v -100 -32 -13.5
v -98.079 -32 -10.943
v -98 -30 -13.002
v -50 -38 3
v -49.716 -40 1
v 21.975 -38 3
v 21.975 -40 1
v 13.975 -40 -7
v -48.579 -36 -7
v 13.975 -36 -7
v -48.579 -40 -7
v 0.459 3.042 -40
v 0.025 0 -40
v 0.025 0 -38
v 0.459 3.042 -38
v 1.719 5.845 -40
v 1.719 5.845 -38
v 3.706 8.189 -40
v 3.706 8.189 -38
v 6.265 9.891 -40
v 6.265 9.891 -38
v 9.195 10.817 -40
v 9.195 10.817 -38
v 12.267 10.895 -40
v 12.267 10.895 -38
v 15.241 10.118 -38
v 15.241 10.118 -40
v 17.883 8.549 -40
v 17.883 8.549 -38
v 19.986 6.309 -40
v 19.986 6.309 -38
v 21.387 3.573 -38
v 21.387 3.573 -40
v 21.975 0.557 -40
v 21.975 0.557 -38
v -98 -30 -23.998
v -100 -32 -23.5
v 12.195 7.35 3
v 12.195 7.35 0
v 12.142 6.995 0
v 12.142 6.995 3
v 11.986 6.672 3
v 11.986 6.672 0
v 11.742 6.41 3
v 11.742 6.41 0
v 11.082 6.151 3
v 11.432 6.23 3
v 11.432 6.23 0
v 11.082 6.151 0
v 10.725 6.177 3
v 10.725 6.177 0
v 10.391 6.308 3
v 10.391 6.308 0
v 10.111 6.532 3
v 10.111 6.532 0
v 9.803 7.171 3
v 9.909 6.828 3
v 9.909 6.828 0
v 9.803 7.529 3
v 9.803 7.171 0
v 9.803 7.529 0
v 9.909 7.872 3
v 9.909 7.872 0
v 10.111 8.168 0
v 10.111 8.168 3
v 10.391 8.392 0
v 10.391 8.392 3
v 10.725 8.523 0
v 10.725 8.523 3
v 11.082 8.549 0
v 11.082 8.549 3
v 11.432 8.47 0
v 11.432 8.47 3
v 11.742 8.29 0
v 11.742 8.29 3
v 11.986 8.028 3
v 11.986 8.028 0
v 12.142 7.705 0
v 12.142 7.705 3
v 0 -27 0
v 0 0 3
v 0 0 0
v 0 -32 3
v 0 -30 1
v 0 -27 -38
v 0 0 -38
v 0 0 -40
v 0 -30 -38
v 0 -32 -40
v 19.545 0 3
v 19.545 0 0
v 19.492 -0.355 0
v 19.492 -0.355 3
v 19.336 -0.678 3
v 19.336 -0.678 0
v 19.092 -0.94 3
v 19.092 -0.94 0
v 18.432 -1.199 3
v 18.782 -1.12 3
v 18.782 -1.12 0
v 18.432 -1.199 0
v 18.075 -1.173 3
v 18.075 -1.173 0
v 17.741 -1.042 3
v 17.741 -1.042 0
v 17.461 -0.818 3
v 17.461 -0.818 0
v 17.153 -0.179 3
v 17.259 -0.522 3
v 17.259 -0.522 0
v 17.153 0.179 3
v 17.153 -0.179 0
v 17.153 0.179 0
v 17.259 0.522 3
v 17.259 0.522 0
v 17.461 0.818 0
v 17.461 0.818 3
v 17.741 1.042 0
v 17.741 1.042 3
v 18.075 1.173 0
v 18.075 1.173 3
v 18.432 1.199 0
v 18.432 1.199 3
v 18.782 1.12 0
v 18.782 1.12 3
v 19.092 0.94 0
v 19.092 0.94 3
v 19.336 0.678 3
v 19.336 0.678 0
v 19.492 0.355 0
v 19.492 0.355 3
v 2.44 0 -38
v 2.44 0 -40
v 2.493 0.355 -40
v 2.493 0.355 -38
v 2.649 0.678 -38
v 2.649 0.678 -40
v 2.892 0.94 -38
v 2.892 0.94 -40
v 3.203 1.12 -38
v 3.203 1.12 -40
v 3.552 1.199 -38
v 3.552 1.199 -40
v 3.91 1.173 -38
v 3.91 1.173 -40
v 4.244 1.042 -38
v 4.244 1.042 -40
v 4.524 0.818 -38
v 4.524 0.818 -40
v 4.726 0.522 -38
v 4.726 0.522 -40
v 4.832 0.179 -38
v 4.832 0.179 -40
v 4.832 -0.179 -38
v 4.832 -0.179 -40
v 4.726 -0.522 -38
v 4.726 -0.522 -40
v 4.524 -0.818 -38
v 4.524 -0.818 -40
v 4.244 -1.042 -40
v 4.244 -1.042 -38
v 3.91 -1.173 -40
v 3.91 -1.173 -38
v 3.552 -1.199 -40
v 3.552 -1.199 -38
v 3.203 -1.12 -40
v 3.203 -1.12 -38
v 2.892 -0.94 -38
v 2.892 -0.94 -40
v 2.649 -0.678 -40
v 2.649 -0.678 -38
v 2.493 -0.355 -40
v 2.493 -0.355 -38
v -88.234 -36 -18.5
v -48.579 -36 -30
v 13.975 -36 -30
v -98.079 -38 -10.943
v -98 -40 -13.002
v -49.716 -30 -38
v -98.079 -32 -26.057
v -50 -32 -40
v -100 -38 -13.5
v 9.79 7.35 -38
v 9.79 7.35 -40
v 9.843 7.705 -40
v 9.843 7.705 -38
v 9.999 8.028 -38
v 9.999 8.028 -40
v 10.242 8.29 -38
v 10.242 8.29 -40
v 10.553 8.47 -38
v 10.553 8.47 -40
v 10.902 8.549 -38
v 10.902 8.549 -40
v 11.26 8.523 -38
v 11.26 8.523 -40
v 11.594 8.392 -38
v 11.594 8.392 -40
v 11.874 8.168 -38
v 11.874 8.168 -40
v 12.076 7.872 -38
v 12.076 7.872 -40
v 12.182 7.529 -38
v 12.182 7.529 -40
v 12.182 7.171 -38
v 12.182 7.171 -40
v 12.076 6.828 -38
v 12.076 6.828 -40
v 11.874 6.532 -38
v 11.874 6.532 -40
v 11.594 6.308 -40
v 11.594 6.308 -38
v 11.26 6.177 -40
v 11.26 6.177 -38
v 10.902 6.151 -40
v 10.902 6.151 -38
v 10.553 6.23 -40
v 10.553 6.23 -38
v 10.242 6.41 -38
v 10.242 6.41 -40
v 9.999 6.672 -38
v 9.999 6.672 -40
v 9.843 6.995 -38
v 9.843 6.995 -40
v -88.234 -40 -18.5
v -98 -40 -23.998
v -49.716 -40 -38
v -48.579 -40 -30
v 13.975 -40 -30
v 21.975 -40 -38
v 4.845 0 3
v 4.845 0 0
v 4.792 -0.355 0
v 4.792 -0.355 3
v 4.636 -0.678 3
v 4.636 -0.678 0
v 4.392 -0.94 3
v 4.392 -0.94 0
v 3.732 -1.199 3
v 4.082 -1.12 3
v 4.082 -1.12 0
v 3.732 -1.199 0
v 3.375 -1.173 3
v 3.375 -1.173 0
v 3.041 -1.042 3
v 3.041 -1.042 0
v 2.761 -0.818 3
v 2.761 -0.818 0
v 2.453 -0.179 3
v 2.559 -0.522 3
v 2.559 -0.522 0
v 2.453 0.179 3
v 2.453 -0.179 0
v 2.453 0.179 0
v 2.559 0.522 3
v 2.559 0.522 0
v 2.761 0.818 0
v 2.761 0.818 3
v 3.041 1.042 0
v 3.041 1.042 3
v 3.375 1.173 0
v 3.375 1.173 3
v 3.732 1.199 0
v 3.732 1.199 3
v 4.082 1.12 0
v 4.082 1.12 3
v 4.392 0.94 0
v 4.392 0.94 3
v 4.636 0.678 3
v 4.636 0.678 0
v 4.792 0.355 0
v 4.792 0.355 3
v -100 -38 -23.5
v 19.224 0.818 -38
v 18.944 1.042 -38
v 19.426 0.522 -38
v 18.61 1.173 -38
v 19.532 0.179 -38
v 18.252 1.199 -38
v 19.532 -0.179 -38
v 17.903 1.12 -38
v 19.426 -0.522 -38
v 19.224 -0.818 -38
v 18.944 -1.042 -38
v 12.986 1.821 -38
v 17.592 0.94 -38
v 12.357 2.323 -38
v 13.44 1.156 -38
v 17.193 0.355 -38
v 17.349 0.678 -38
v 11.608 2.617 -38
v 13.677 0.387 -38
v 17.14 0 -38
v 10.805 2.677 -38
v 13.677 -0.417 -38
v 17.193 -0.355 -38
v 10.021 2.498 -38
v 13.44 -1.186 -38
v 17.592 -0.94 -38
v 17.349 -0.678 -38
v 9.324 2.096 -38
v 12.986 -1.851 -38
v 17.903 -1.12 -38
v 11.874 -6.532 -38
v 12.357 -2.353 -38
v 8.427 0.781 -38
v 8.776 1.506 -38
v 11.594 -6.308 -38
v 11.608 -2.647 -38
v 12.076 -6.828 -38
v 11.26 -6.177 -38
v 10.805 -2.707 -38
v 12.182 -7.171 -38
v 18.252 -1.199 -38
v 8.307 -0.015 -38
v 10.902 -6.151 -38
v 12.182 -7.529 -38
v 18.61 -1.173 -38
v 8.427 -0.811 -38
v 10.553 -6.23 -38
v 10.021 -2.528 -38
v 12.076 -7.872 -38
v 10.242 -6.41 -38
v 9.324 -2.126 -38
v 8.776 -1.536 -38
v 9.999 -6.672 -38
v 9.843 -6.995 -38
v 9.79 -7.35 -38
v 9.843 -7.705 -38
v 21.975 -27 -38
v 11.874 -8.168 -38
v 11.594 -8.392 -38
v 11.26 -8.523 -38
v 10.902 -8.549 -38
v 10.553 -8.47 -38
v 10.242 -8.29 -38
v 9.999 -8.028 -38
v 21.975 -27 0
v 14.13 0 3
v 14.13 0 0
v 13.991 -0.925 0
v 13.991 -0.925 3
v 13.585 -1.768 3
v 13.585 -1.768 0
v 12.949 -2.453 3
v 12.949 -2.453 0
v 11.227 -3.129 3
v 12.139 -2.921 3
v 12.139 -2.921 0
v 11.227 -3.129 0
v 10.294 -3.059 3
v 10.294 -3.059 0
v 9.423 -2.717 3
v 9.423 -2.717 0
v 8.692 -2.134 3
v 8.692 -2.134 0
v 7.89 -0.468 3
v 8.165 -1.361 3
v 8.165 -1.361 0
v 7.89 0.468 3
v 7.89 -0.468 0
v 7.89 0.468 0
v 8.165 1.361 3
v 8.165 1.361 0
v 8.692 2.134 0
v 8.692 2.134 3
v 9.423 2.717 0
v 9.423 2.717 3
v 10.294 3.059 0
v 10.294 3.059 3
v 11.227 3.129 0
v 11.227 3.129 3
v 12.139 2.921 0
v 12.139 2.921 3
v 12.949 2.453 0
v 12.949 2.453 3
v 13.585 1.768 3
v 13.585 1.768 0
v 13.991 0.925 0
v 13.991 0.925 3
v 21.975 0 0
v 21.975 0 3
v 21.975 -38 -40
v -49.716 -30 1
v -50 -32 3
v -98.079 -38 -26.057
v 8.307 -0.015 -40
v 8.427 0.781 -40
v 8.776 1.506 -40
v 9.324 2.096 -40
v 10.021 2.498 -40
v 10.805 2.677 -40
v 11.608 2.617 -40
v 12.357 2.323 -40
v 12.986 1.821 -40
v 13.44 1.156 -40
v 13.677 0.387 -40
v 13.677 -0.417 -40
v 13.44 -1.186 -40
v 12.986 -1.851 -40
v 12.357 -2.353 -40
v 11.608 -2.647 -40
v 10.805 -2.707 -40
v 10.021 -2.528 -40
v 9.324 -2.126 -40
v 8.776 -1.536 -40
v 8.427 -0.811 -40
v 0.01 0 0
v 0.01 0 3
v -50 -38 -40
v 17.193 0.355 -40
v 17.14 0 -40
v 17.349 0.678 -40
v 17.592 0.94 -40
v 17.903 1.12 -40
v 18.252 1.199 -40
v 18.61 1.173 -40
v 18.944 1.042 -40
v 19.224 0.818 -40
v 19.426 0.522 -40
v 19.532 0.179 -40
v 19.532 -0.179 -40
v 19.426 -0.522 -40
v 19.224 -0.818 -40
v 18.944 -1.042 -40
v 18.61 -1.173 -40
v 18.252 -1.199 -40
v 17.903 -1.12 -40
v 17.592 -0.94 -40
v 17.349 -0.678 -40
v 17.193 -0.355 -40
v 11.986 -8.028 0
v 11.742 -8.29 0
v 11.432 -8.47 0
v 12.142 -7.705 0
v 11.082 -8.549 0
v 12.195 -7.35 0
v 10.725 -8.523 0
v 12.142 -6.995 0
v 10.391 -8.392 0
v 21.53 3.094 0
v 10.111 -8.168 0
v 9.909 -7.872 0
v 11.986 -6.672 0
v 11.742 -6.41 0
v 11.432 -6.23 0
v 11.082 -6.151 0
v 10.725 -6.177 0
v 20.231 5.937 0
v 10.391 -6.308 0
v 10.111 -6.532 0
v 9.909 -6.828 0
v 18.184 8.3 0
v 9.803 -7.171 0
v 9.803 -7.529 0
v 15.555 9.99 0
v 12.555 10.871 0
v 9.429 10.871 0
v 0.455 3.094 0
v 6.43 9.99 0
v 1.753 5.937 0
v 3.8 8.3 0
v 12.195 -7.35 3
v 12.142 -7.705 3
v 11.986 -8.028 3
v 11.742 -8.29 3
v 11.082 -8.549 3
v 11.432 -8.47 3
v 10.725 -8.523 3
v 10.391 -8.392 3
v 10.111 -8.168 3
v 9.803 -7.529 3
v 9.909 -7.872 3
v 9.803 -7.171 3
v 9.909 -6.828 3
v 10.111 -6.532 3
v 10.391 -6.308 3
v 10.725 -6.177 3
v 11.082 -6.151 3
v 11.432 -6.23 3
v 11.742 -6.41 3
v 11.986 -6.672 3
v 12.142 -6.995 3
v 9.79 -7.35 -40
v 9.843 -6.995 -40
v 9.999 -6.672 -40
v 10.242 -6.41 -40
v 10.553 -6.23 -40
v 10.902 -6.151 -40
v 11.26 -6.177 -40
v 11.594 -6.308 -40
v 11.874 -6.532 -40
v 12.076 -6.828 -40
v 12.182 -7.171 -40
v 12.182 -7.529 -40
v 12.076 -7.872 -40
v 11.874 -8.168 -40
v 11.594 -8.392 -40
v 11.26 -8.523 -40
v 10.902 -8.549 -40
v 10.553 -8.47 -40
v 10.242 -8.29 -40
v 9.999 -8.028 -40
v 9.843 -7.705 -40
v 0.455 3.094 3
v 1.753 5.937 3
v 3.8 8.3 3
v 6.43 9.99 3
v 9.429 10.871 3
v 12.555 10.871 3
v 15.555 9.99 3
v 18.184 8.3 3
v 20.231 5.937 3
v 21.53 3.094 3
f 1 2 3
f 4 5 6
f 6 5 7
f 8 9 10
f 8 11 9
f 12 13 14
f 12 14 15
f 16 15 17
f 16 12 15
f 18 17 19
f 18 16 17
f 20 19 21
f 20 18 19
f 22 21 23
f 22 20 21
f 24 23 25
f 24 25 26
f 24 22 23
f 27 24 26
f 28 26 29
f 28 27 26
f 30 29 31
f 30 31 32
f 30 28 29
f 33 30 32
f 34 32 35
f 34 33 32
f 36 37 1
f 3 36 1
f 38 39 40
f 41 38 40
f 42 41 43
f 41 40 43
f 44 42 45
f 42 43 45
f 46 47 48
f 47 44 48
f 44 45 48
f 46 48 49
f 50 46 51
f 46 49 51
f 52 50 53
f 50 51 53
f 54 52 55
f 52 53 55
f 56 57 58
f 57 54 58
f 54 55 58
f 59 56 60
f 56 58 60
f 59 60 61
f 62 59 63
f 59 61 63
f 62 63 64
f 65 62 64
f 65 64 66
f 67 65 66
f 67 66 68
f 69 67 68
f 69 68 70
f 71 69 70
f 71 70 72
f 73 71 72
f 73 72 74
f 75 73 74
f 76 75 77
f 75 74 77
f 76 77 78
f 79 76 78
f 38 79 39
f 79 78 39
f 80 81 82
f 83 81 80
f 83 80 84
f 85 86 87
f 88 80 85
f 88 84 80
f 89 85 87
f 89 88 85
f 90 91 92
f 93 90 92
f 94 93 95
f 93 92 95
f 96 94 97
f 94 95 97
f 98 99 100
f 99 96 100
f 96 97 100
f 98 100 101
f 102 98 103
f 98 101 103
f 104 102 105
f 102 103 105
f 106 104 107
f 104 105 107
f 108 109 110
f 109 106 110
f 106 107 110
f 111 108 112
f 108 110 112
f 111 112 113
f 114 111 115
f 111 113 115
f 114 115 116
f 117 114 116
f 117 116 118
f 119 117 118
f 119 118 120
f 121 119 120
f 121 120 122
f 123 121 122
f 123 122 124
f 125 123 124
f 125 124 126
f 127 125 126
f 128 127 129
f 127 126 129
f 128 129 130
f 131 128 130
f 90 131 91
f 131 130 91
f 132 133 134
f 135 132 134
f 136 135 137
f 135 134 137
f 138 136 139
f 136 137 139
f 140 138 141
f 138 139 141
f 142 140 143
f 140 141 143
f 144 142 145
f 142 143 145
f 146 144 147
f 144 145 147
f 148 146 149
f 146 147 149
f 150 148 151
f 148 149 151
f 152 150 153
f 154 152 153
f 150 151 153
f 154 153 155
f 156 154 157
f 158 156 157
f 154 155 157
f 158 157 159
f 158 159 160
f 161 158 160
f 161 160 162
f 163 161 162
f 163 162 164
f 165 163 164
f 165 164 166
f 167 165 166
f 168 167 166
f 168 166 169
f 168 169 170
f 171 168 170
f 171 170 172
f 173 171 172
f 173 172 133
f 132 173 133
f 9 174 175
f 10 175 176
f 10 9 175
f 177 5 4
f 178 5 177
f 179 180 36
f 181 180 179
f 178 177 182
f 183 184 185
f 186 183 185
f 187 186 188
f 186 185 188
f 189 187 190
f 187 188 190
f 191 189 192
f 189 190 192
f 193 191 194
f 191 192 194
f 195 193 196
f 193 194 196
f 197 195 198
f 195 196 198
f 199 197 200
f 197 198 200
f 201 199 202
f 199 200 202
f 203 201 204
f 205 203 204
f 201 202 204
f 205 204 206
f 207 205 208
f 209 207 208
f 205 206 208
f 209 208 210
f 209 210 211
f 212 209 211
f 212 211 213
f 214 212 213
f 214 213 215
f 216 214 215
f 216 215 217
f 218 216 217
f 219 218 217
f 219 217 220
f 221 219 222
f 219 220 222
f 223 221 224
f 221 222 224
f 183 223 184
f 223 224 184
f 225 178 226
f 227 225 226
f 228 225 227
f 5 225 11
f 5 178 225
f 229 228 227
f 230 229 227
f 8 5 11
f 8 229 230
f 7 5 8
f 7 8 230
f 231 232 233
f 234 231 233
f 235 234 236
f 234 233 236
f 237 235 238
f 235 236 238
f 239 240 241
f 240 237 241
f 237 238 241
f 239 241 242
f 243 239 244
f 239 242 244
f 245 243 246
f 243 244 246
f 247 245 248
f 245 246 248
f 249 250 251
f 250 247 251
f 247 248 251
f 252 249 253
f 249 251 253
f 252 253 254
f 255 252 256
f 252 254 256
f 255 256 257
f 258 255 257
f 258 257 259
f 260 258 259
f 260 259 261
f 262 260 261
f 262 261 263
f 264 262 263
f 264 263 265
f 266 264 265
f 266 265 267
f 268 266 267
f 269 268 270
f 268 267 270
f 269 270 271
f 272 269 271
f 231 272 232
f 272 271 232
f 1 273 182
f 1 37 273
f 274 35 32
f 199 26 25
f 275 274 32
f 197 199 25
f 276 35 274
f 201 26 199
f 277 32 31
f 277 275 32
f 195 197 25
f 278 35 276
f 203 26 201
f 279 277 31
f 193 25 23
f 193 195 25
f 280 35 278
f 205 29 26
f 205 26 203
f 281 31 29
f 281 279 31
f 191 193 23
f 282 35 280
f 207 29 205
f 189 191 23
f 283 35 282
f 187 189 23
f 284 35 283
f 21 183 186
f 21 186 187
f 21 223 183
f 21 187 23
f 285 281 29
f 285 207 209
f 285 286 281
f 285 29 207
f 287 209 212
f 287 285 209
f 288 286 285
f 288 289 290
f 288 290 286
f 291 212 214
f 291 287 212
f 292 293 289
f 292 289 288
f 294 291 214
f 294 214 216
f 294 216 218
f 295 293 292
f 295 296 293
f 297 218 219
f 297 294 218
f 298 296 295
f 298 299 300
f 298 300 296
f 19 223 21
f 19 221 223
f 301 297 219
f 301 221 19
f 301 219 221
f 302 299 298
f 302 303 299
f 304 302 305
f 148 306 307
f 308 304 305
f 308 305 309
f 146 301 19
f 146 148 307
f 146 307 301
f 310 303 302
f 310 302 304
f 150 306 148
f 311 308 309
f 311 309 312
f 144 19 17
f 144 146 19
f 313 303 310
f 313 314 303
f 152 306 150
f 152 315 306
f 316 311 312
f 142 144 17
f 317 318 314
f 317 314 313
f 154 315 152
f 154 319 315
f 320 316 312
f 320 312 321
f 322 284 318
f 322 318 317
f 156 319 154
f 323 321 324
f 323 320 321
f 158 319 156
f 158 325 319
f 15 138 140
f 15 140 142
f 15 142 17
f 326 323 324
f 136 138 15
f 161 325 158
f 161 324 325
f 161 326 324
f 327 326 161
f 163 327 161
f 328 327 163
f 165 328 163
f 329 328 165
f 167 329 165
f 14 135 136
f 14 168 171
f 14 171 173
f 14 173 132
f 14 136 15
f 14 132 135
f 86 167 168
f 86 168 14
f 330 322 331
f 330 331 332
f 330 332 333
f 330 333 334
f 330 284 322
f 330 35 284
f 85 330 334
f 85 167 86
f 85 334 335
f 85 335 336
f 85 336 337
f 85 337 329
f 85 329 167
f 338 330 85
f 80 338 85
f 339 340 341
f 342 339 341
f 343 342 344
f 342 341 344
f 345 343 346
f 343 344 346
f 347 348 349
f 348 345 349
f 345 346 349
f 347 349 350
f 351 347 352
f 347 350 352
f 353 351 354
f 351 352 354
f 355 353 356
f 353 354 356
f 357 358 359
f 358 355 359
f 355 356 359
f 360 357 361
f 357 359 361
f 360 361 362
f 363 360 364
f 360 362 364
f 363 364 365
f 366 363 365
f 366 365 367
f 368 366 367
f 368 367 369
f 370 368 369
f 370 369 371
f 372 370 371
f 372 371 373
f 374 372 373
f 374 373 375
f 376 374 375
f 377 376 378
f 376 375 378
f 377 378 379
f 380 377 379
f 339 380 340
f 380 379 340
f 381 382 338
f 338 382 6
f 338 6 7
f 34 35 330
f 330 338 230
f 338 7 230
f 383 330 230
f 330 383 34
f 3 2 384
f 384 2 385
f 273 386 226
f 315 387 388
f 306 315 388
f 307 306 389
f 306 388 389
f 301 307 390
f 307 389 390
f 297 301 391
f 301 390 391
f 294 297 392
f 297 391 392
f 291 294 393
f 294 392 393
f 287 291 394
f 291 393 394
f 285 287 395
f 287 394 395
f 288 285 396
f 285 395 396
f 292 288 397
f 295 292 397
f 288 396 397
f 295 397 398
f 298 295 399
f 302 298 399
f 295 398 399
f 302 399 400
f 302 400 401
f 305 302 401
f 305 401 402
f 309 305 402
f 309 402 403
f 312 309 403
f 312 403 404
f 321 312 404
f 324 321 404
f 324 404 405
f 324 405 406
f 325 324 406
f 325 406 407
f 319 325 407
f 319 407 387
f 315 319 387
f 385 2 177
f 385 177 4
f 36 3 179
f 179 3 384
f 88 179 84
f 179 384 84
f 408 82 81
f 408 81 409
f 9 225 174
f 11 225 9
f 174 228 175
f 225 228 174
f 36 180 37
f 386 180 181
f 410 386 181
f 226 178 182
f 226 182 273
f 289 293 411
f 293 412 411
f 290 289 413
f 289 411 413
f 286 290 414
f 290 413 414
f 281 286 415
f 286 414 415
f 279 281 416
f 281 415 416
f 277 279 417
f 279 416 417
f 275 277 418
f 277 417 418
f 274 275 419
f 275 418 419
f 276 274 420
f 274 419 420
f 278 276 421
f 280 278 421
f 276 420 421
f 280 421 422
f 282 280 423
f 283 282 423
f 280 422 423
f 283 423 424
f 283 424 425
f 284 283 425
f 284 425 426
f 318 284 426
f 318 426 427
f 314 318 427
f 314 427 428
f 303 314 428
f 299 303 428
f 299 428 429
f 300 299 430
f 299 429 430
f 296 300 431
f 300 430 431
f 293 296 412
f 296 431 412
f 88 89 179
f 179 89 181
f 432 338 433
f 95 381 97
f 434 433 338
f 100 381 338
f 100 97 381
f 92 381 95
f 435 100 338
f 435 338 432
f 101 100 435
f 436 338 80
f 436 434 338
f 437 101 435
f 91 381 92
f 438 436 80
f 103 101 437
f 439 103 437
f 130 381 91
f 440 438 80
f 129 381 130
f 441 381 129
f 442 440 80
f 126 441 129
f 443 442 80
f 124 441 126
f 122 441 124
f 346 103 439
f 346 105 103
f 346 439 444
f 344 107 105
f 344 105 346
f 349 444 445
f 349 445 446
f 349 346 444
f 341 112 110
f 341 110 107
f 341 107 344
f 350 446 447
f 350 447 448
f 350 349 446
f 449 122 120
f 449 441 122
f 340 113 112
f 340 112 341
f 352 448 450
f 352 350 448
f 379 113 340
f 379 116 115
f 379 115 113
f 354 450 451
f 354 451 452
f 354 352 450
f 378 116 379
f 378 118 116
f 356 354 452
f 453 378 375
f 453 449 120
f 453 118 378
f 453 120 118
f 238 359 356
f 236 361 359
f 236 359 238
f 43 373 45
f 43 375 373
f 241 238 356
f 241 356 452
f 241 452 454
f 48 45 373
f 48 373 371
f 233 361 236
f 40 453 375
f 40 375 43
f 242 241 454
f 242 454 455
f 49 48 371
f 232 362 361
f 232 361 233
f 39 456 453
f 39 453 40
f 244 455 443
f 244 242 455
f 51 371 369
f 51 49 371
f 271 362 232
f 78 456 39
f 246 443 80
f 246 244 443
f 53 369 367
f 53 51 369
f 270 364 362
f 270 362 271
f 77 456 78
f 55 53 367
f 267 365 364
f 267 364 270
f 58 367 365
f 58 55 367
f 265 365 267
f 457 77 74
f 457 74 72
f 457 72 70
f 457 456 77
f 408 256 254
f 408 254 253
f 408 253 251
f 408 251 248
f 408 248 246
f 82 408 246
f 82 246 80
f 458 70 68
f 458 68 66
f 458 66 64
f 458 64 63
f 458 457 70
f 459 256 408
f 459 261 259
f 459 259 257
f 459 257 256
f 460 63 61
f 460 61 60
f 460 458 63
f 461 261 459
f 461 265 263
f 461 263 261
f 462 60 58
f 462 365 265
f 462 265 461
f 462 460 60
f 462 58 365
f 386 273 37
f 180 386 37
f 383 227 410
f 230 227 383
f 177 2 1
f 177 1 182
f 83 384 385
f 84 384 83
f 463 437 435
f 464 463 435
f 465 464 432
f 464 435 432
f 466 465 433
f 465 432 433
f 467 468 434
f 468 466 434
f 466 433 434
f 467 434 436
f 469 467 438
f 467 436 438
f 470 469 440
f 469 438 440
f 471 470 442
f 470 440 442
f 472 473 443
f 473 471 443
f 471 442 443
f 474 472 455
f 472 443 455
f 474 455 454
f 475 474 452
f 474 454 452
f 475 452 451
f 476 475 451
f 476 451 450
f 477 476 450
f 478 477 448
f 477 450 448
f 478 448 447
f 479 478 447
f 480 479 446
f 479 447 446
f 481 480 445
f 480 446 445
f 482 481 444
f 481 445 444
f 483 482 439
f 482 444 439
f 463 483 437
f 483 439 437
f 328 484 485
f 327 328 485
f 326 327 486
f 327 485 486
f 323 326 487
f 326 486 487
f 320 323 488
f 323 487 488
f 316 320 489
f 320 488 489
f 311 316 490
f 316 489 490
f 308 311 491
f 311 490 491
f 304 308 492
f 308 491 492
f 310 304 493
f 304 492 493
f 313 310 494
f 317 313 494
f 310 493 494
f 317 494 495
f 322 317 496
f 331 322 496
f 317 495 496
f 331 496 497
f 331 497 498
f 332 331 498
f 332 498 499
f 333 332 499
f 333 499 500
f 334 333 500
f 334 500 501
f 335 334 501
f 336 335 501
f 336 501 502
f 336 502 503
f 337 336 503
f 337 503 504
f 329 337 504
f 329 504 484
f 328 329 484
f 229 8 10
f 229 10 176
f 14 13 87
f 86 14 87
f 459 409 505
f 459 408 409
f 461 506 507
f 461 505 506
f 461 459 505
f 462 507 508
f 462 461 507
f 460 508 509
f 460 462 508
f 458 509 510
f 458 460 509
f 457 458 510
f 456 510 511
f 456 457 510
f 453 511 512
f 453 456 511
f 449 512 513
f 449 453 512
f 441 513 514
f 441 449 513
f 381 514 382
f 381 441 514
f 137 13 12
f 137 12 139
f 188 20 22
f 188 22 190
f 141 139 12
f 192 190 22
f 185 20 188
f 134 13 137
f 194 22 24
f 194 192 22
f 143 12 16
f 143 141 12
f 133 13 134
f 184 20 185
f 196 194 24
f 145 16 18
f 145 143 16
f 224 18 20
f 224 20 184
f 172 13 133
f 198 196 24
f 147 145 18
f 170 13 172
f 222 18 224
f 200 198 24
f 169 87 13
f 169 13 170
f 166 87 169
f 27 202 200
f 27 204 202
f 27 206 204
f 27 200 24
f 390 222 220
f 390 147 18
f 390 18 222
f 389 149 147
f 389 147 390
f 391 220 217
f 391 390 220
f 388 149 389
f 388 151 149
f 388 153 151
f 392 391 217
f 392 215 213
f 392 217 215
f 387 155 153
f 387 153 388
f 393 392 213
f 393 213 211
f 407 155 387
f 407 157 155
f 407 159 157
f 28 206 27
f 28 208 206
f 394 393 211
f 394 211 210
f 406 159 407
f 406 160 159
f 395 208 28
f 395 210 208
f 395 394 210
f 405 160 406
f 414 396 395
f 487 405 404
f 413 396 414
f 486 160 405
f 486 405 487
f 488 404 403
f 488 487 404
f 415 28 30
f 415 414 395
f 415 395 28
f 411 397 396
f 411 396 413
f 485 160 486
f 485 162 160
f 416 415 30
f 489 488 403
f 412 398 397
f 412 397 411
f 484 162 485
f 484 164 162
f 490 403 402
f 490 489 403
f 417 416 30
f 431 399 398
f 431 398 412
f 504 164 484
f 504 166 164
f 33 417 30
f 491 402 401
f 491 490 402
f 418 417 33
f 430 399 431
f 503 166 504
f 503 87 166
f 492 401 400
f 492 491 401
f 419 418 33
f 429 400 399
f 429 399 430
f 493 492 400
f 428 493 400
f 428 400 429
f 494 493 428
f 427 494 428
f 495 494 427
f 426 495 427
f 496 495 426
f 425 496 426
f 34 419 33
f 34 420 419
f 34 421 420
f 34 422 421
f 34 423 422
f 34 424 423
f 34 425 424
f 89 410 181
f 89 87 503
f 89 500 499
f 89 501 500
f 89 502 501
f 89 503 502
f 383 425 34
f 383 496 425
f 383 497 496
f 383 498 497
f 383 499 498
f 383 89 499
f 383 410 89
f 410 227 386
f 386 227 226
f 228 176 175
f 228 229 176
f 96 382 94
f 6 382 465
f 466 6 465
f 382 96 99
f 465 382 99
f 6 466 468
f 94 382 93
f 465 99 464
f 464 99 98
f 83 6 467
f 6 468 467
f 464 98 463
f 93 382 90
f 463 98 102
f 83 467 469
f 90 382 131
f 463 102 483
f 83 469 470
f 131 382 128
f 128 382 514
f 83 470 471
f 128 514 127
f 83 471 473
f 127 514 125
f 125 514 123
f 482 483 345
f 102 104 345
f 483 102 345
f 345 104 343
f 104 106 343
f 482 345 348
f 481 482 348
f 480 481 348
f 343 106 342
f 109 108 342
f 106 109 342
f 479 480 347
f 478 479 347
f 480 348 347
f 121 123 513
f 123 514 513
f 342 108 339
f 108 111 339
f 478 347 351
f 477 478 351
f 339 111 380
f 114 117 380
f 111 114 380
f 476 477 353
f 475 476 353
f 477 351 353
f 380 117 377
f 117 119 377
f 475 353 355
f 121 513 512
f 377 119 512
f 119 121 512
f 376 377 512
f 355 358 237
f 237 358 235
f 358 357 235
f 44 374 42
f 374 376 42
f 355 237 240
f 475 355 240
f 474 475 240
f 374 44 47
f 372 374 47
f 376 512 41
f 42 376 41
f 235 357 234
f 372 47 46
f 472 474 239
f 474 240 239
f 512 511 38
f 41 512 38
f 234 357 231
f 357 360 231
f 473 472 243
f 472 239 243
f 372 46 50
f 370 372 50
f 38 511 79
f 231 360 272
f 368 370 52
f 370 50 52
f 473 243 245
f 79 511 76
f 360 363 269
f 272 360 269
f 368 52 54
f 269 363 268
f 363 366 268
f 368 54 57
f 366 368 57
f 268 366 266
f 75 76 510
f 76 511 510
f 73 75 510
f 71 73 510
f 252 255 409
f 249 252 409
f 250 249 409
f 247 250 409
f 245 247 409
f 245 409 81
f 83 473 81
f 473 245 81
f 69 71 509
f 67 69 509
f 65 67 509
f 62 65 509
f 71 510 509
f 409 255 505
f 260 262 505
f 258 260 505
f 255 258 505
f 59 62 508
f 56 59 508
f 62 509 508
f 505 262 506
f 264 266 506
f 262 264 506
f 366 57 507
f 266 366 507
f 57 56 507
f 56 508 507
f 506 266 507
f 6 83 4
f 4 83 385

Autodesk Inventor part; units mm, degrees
ref_plane "YZ Plane" through (0, 0, 0) normal (1, 0, 0) x (0, 1, 0)
ref_plane "XZ Plane" through (0, 0, 0) normal (0, 1, 0) x (-1, 0, 0)
ref_plane "XY Plane" through (0, 0, 0) normal (0, 0, 1) x (1, 0, 0)
ref_plane "Plano de trabajo1" through (0, 0, 0) normal (0, 0, 1) x (1, 0, 0)
sketch "Boceto1" plane through (0, 0, 0) normal (0, 0, 1) x (1, 0, 0)
  circle A0 centre (10.9923, 0) radius 10.9823 projected
  circle A1 centre (10.9923, 0) radius 3.1378 projected
  circle A2 centre (18.3423, 0) radius 1.2028 projected
  circle A3 centre (10.9923, 7.35) radius 1.2028 projected
  circle A4 centre (3.6423, 0) radius 1.2028 projected
  circle A5 centre (10.9923, -7.35) radius 1.2028 projected
  line L0 (0, 0) -> (0, 30)
  line L1 (21.9746, 0) -> (21.9746, -30)
  line L2 (0, 0) -> (0, -30)
  line L3 (0, -30) -> (21.9746, -30)
  circle A6 centre (10.9923, 0) radius 3.1378
  circle A7 centre (18.3423, 0) radius 1.2028
  circle A8 centre (10.9923, -7.35) radius 1.2028
  circle A9 centre (3.6423, 0) radius 1.2028
  circle A10 centre (10.9923, 7.35) radius 1.2028
  circle A11 centre (10.9923, 0) radius 10.9823
  line L4 (0, 0) -> (0, -30)
  line L5 (0, -30) -> (21.9746, -30)
  line L6 (21.9746, -30) -> (21.9746, 0)
  dimension "d0" = 30
  dimension "d1" = 30
extrude "Extrusión1" add sketch "Boceto1" along normal blind 3
sketch "Boceto2" plane through (10.9923, 0, 3) normal (0, 0, 1) x (1, 0, 0)
  circle A0 centre (0, 0) radius 10.9823 projected
  line L0 (10.9823, 0) -> (10.9823, -30)
  line L1 (10.9823, -30) -> (-9.7118, -30)
  line L2 (-9.7118, -30) -> (-10.9923, 0)
  circle A1 centre (0, 0) radius 10.9823 projected
  circle A2 centre (0, -7.35) radius 1.2028 projected
  circle A3 centre (-7.35, 0) radius 1.2028 projected
  circle A4 centre (0, 7.35) radius 1.2028 projected
  circle A5 centre (7.35, 0) radius 1.2028 projected
  circle A6 centre (0, 0) radius 3.1378 projected
  point P0 (-10.9723, -0.4683)
  dimension "d4" = 30
extrude "Extrusión2" add sketch "Boceto2" against normal blind 3 contours L0 L1 L2 A0
sketch "Boceto3" plane through (0, 0, 0) normal (0, 0, -1) x (-1, 0, 0)
  point P0 (0, 0)
sketch "Boceto4" plane through (0, 0, 3) normal (0, 0, 1) x (1, 0, 0)
  point P0 (0, 0)
sketch "Boceto5" plane through (0, 0, 0) normal (0, 0, -1) x (-1, 0, 0)
  arc A0 (-0.02, -0.4683) -> (-21.9746, 0) centre (-10.9923, 0) ccw projected
  line L0 (-21.9746, 0) -> (-21.9746, -30) projected
  line L1 (-21.9746, -30) -> (-1.2805, -30) projected
  line L2 (-1.2805, -30) -> (-0.02, -0.4683) projected
  circle A1 centre (-10.9923, -7.35) radius 1.2028 projected
  circle A2 centre (-3.6423, 0) radius 1.2028 projected
  circle A3 centre (-10.9923, 7.35) radius 1.2028 projected
  circle A4 centre (-18.3423, 0) radius 1.2028 projected
  circle A5 centre (-10.9923, 0) radius 3.1378 projected
  line L3 (-21.9746, -30) -> (0, -30)
  line L4 (0, -30) -> (0, 0)
  line L5 (0, 0) -> (-21.9746, 0)
  line L6 (-21.9746, 0) -> (-21.9746, -30)
  point P0 (-0.01, 0)
extrude "Extrusión3" add sketch "Boceto5" against normal blind 3 contours A0 L5 L4 L3 L2
sketch "Boceto6" plane through (0, 0, 0) normal (0, 0, -1) x (-1, 0, 0)
  point P0 (0, 0)
sketch "Boceto7" plane through (0, 0, 0) normal (0, 0, -1) x (-1, 0, 0)
  line L0 (-21.9746, -30) -> (0, -30) projected
  line L1 (-21.9746, -30) -> (-21.9746, 0) projected
  line L2 (0, -30) -> (-21.9746, -30)
  line L3 (-21.9746, -30) -> (-21.9746, -27)
  line L4 (-21.9746, -27) -> (0, -27)
  line L5 (0, -27) -> (0, -30)
  point P0 (0, 0)
  dimension "d9" = 3
extrude "Extrusión4" add sketch "Boceto7" along normal blind 40
sketch "Boceto8" plane through (0, -27, 0) normal (0, 1, 0) x (1, 0, 0)
  line L0 (0, -3) -> (0, 40) projected
  line L1 (21.9746, -3) -> (21.9746, 40) projected
  line L2 (0, 40) -> (21.9746, 40)
  line L3 (21.9746, 40) -> (21.9746, 38)
  line L4 (21.9746, 38) -> (0, 38)
  line L5 (0, 38) -> (0, 40)
  point P0 (0, 0)
  point P1 (21.9746, 40)
  point P2 (0, 38)
  dimension "d12" = 2
extrude "Extrusión5" add sketch "Boceto8" along normal blind 40
sketch "Boceto9" plane through (0, 0, -40) normal (0, 0, -1) x (-1, 0, 0)
  circle A0 centre (-11.0072, -0.015) radius 2.7 projected
  circle A1 centre (-11.0072, -0.015) radius 10.9823 projected
  circle A2 centre (-18.3423, 0) radius 1.2028 projected
  circle A3 centre (-10.9923, -7.35) radius 1.2028 projected
  circle A4 centre (-10.9923, 7.35) radius 1.2028 projected
  circle A5 centre (-3.6423, 0) radius 1.2028 projected
  line L0 (-21.9746, -30) -> (-21.9746, 13) projected
  line L1 (-21.9746, -30) -> (0, -30) projected
  line L2 (0, -30) -> (0, 13) projected
  line L3 (-21.9746, 13) -> (0, 13) projected
  line L4 (-21.5706, 0) -> (-25.972, 0)
  line L5 (-25.972, 0) -> (-25.972, 18.1609)
  line L6 (-25.972, 18.1609) -> (4.5124, 18.1609)
  line L7 (4.5124, 18.1609) -> (4.5124, 1.2028)
  line L8 (4.5124, 1.2028) -> (4.5124, 0)
  line L9 (-3.6423, 0) -> (4.822, 0)
  point P0 (0, 0)
  point P1 (-21.9746, 0.557)
  point P2 (-0.0249, 0)
  point P3 (0, 0)
extrude "Extrusión6" cut sketch "Boceto9" against normal blind 40 contours A0 | A1 L0 L3 L2 L9 | A2 | A3 | A4 | A5
sketch "Boceto10" plane through (0, -30, 3) normal (0, -1, 0) x (1, 0, 0)
  point P0 (0, -3)
sketch "Boceto11" plane through (0, -30, 3) normal (0, -1, 0) x (1, 0, 0)
  line L0 (0.0249, -43) -> (21.9746, -43) projected
  line L1 (0, -3) -> (0, 0) projected
  line L2 (21.9746, -43) -> (0, -43)
  line L3 (0, -43) -> (0, 0)
  line L4 (0, 0) -> (21.9746, 0)
  line L5 (21.9746, 0) -> (21.9746, -43)
  line L6 (0, -43) -> (-100, -43)
  line L7 (-100, -43) -> (-100, 0)
  line L8 (-100, 0) -> (0, 0)
  line L9 (0, 0) -> (0, -43)
  line L10 (-100, 0) -> (-100, -21.5)
  line L11 (-100, -21.5) -> (-100, -14.5)
  line L12 (-100, -14.5) -> (-100, -28.5)
  line L13 (-100, -28.5) -> (-50, -43)
  line L14 (-50, -43) -> (-50, 0)
  line L15 (-100, -14.5) -> (-50, 0)
  dimension "d17" = 100
  dimension "d18" = 21.5
  dimension "d19" = 7
  dimension "d20" = 14
extrude "Extrusión7" add sketch "Boceto11" along normal blind 10 contours L2 L3 L1 L4 L5 L0 | L6 L14 L8 L1 L3 | L13 L7 L15 L14
chamfer "Chaflán1" distance 2 angle 45 12 edges at (-14.0127, -40, -40) (-75, -40, -32.75) (-75, -30, -32.75) (-25, -30, -40) (-14.0127, -40, 3) (-75, -40, -4.25) (-100, -40, -18.5) (-75, -30, -4.25) (-25, -30, 3) (-100, -30, -18.5) (-100, -35, -25.5) (-100, -35, -11.5)
sketch "Boceto12" plane through (0, -40, 3) normal (0, -1, 0) x (1, 0, 0)
  line L0 (-49.7159, -2) -> (21.9746, -2) projected
  line L1 (-98, -16.0024) -> (-49.7159, -2) projected
  line L2 (-98, -26.9976) -> (-98, -16.0024) projected
  line L3 (-49.7159, -41) -> (-98, -26.9976) projected
  line L4 (21.9746, -41) -> (-49.7159, -41) projected
  line L5 (21.9746, -41) -> (21.9746, -2) projected
  line L6 (-48.5793, -33) -> (-88.2344, -21.5)
  line L7 (-88.2344, -21.5) -> (-48.5793, -10)
  line L8 (-48.5793, -10) -> (13.9746, -10)
  line L9 (13.9746, -10) -> (13.9746, -33)
  line L10 (13.9746, -33) -> (-48.5793, -33)
  point P0 (0, -3)
  dimension "d26" = 8
extrude "Extrusión8" cut sketch "Boceto12" against normal blind 4 contours L6 L7 L8 L9 L10
properties part number "tibia"
